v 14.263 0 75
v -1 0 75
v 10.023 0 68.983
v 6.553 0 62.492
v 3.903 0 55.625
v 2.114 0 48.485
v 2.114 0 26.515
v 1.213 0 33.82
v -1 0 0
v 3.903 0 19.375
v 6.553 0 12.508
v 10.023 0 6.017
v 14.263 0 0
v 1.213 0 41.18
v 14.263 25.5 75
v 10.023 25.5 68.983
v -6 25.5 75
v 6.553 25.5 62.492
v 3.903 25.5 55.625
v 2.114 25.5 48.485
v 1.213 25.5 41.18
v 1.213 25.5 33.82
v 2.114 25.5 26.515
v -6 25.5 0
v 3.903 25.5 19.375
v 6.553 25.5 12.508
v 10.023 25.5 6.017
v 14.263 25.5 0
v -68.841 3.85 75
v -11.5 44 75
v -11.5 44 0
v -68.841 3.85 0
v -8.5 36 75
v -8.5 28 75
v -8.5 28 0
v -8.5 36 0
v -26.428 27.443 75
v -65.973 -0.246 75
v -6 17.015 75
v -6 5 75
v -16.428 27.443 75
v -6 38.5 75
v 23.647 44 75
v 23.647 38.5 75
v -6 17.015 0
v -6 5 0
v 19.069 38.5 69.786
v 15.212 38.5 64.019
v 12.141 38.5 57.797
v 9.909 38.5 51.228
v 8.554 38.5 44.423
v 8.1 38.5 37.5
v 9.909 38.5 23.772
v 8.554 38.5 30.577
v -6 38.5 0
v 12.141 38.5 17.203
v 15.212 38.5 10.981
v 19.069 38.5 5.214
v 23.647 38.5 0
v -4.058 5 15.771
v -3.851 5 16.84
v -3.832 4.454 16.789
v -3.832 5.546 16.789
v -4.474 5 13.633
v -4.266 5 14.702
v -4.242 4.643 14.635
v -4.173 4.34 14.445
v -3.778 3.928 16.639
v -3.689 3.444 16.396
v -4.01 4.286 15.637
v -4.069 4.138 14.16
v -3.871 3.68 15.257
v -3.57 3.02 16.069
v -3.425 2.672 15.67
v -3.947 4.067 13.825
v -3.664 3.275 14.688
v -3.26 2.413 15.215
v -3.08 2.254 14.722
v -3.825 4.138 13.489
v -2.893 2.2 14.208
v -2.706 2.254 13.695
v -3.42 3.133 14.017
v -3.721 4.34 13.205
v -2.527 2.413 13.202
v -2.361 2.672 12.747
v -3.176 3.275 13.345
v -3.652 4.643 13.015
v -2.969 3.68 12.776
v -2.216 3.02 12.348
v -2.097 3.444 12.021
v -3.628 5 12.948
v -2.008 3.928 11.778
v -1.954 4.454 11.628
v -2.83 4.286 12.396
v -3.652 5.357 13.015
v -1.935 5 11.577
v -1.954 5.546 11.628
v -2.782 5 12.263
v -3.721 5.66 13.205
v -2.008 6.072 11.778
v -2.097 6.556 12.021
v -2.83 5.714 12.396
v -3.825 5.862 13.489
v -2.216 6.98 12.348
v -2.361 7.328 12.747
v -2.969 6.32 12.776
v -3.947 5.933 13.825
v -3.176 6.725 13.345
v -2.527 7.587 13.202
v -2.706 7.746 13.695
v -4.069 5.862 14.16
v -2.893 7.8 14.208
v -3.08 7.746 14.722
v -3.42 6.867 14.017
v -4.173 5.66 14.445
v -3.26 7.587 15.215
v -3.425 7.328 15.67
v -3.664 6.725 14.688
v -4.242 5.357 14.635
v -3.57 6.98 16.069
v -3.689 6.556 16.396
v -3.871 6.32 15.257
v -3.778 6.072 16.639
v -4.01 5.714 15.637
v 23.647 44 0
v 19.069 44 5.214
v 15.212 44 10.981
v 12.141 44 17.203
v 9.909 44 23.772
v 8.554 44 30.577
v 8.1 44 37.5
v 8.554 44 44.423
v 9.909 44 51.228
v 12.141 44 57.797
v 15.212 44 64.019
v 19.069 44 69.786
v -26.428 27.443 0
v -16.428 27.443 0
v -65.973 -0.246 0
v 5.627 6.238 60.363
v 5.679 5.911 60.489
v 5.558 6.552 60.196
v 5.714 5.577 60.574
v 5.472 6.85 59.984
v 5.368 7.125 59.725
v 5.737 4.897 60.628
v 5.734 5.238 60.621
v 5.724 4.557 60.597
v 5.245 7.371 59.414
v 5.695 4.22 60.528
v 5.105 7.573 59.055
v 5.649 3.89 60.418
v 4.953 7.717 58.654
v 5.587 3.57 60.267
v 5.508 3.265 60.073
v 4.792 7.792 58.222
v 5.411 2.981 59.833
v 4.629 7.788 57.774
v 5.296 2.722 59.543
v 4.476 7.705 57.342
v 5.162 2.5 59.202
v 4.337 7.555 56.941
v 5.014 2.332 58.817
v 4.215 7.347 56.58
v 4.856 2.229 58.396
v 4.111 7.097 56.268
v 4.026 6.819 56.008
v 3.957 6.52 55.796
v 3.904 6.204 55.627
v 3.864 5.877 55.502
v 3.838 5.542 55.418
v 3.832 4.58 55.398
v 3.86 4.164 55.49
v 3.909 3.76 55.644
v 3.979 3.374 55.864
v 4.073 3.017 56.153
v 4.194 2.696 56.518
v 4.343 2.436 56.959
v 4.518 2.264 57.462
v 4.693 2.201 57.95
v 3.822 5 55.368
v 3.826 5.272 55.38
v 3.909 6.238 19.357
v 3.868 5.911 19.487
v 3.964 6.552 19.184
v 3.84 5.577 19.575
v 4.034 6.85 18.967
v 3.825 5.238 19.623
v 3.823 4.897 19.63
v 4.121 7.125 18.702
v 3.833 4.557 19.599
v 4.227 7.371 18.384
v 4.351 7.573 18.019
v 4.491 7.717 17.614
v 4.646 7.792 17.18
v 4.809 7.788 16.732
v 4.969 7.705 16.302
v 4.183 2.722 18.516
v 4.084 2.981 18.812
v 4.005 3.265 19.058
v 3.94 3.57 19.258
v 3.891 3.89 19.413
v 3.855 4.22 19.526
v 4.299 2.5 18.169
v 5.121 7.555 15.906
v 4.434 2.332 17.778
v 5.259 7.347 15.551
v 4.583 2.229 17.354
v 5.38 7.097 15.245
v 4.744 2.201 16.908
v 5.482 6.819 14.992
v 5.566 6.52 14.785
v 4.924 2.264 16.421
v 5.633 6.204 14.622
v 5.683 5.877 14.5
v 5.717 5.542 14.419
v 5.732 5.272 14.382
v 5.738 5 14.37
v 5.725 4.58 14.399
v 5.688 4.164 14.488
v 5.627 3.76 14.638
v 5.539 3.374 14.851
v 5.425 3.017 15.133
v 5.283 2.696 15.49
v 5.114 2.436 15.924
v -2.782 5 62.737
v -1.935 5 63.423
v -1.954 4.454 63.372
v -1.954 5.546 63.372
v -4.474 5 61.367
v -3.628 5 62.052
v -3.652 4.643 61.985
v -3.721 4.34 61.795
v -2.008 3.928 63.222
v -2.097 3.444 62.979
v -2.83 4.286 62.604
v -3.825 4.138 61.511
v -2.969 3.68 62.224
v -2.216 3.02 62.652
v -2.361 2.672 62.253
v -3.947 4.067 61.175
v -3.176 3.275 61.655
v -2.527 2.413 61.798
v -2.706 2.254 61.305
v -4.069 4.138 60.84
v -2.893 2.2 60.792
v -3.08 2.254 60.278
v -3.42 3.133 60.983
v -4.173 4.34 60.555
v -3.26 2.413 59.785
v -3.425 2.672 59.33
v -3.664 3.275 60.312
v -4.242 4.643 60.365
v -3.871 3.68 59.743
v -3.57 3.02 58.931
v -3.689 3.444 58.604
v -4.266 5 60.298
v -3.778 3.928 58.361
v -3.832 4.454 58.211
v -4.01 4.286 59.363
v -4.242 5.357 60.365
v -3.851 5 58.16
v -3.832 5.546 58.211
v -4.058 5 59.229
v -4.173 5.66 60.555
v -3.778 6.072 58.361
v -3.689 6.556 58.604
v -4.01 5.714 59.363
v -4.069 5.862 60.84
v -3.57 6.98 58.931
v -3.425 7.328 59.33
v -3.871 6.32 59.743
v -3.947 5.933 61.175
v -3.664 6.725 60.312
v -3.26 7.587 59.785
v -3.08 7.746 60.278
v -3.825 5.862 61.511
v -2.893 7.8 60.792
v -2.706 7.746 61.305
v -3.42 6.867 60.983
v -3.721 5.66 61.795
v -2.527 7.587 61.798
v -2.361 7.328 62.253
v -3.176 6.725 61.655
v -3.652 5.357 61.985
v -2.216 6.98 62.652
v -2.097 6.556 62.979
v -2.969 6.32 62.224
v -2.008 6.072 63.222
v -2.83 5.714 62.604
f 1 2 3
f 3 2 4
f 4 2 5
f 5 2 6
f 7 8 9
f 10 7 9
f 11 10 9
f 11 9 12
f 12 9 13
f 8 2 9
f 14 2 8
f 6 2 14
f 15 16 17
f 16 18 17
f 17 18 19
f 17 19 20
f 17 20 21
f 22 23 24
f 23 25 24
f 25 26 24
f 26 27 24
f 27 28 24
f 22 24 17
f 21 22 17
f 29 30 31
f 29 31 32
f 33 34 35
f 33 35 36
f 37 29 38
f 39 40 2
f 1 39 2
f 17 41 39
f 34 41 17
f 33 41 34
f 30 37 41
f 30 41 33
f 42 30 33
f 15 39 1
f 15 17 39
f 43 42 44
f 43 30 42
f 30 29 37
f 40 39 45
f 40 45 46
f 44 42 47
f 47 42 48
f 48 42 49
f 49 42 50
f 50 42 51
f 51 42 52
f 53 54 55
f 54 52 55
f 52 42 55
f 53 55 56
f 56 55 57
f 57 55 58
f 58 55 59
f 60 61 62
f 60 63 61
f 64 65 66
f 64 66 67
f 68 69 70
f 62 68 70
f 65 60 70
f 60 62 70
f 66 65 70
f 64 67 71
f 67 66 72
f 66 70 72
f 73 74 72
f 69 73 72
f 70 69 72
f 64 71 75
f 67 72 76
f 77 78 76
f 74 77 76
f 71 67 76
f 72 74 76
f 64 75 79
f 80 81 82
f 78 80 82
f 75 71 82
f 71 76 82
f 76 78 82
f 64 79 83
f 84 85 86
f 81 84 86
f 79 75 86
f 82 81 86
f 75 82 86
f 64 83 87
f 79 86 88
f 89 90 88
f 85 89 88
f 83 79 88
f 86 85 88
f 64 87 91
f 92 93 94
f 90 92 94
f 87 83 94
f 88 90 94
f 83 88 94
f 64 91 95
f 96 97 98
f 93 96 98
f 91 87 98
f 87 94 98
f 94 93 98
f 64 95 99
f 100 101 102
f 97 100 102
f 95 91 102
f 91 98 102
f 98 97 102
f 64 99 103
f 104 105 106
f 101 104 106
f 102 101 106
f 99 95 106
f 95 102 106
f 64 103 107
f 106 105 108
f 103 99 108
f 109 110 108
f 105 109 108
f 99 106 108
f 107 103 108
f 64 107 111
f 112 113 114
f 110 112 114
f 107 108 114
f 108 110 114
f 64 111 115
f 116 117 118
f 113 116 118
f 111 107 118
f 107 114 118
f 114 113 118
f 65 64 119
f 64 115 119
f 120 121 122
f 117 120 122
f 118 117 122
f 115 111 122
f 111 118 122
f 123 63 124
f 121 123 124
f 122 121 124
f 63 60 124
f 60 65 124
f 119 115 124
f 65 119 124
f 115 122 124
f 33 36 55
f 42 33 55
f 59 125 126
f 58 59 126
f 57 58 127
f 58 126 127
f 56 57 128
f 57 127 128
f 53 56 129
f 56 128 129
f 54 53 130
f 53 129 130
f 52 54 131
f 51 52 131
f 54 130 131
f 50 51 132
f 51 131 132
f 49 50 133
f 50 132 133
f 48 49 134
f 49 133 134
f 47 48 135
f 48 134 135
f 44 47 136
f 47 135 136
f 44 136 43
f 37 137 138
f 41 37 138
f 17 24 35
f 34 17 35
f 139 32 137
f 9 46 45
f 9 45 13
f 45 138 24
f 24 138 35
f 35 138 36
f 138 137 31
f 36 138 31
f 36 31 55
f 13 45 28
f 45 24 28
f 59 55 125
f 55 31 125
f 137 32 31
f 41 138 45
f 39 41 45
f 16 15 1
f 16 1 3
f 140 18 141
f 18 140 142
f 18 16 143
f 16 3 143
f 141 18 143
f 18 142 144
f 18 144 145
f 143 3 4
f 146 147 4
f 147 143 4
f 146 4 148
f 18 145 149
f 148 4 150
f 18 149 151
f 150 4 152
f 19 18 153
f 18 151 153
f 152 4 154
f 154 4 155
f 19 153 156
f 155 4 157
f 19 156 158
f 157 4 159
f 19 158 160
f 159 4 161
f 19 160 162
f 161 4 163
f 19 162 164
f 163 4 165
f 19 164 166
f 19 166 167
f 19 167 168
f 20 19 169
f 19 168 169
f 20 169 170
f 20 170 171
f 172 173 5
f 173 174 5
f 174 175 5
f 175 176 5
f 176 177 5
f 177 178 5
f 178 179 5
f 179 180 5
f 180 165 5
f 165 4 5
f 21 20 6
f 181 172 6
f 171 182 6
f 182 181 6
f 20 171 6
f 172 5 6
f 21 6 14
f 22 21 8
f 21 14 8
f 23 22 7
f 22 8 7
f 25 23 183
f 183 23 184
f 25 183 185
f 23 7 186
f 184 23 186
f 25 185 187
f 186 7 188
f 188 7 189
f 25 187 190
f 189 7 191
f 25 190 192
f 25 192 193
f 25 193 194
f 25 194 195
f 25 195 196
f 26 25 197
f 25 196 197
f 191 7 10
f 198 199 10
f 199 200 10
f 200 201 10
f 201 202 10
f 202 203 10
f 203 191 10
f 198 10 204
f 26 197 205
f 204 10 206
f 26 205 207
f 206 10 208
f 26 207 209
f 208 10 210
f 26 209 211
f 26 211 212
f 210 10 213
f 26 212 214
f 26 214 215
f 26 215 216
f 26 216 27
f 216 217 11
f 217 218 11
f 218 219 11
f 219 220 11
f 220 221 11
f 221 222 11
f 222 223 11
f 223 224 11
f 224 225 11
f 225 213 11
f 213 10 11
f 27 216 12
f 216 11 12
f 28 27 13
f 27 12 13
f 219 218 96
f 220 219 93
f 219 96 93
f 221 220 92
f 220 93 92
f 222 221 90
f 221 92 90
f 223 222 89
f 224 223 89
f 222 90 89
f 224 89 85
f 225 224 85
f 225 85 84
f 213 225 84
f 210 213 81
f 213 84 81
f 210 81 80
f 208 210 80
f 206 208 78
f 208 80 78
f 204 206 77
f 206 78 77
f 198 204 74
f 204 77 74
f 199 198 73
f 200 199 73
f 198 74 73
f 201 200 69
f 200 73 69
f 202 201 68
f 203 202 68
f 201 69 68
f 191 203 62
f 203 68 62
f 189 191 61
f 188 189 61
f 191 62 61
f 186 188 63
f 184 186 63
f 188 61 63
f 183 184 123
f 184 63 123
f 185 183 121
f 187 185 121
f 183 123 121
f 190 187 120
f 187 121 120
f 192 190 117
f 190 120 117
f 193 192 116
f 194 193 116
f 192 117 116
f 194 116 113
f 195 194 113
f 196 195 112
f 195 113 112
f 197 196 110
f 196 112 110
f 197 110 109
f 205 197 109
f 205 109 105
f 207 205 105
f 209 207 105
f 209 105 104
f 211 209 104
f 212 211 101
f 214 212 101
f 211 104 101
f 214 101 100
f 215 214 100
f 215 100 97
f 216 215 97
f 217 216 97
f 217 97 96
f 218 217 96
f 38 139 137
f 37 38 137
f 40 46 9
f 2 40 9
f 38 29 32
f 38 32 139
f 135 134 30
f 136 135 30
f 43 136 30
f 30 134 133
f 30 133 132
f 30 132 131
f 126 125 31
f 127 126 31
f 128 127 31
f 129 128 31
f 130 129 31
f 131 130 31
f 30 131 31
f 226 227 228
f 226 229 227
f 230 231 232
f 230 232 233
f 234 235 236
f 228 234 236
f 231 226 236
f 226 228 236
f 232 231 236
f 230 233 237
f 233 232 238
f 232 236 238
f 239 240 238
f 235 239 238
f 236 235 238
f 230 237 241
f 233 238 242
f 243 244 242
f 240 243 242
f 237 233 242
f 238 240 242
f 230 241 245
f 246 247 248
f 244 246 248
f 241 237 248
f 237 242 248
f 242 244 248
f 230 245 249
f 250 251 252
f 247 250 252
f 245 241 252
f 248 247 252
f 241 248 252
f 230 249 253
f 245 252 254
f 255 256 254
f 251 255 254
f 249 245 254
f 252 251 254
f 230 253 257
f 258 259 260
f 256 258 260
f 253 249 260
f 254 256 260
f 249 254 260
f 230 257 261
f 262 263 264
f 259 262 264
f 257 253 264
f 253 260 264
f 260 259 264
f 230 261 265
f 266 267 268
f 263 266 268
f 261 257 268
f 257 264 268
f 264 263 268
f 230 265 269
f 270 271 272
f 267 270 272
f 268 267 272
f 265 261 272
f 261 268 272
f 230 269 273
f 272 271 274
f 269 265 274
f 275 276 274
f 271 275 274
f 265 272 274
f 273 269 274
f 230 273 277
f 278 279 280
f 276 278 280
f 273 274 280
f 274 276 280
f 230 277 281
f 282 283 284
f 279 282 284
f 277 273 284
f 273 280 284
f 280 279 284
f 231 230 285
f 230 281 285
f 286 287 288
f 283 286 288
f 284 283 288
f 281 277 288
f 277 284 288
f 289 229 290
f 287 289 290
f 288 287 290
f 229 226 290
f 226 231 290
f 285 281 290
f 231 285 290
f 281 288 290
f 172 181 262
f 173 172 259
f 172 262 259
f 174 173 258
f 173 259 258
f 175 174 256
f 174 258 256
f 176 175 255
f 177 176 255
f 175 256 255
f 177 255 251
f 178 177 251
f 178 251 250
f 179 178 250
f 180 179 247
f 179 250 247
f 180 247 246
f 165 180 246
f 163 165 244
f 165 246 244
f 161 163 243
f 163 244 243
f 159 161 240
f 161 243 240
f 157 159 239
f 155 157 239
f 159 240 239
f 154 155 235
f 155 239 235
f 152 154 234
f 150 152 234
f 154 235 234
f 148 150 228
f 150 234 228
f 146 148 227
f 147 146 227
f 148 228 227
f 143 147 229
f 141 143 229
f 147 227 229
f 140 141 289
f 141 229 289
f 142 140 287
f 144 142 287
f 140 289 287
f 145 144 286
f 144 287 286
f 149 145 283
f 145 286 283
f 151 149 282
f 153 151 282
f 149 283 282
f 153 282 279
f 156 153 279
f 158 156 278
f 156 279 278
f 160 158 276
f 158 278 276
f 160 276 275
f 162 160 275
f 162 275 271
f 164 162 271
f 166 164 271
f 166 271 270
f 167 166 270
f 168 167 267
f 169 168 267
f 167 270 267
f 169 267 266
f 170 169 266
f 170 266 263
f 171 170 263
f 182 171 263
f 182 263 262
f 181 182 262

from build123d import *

# Parameters (mm, degrees)
ESTRUSIONE_ESTRUSIONE1_DEPTH       = 75
SCHIZZO2_R                         = 53
TAGLIO_ESTRUSIONE1_DEPTH           = 75
SCHIZZO3_R                         = 60
TAGLIO_ESTRUSIONE2_DEPTH           = 28
FORO_PER_VITE_M3_1_D               = 5.6
FORO_PER_VITE_M3_1_DEPTH           = 8.1
FORO_PER_VITE_M3_1_TIP             = 1.682409733
FORO_PER_VITE_M3_1_ON_FACE_2_D     = 5.6
FORO_PER_VITE_M3_1_ON_FACE_2_DEPTH = 8.1
FORO_PER_VITE_M3_1_ON_FACE_2_TIP   = 1.682409733


with BuildPart() as part:
    # Schizzo1 → Estrusione-Estrusione1 (new body)
    with BuildSketch(Plane.XY):
        Polygon((-6, 38.5), (38.5, 38.5), (38.5, 44), (-11.5, 44), (-68.8406431, 3.849649455), (-65.972760918, -0.246110766), (-26.428417773, 27.443136398), (-16.428417773, 27.443136398), (-6, 17.014718626), (-6, 5), (-1, 0), (0, 0), (20.5, 0), (20.5, 25.5), (0, 25.5), (-6, 25.5), (-8.5, 28), (-8.5, 36), align=None)
    extrude(amount=ESTRUSIONE_ESTRUSIONE1_DEPTH)

    # Schizzo2 → Taglio-Estrusione1 (cut)
    with BuildSketch(Plane(origin=(0, 44, 0), x_dir=(1, 0, 0), z_dir=(0, 1, 0))):
        with Locations((61.1, -37.5)):
            Circle(SCHIZZO2_R)
    extrude(amount=-TAGLIO_ESTRUSIONE1_DEPTH, mode=Mode.SUBTRACT)

    # Schizzo3 → Taglio-Estrusione2 (cut)
    with BuildSketch(Plane.XZ):
        with Locations((61.1, 37.5)):
            Circle(SCHIZZO3_R)
    extrude(amount=-TAGLIO_ESTRUSIONE2_DEPTH, mode=Mode.SUBTRACT)

    # Foro per Vite M3-1
    with Locations(Plane(origin=(4.718442753, 5, 16.9787914), x_dir=(-0.342020143326, 0, 0.939692620786), z_dir=(0.939692620786, 0, 0.342020143326))):
        with Locations((0, 0)):
            Hole(FORO_PER_VITE_M3_1_D / 2, depth=FORO_PER_VITE_M3_1_DEPTH)
            with Locations((0, 0, -(FORO_PER_VITE_M3_1_DEPTH + FORO_PER_VITE_M3_1_TIP / 2))):  # 118° drill point
                Cone(0, FORO_PER_VITE_M3_1_D / 2, FORO_PER_VITE_M3_1_TIP, mode=Mode.SUBTRACT)

    # Foro per Vite M3-1 on face 2
    with Locations(Plane(origin=(4.718442753, 5, 58.0212086), x_dir=(0.342019894889, 0, 0.939692711209), z_dir=(0.939692711209, 0, -0.342019894889))):
        with Locations((0, 0)):
            Hole(FORO_PER_VITE_M3_1_ON_FACE_2_D / 2, depth=FORO_PER_VITE_M3_1_ON_FACE_2_DEPTH)
            with Locations((0, 0, -(FORO_PER_VITE_M3_1_ON_FACE_2_DEPTH + FORO_PER_VITE_M3_1_ON_FACE_2_TIP / 2))):  # 118° drill point
                Cone(0, FORO_PER_VITE_M3_1_ON_FACE_2_D / 2, FORO_PER_VITE_M3_1_ON_FACE_2_TIP, mode=Mode.SUBTRACT)


solid = part.part
